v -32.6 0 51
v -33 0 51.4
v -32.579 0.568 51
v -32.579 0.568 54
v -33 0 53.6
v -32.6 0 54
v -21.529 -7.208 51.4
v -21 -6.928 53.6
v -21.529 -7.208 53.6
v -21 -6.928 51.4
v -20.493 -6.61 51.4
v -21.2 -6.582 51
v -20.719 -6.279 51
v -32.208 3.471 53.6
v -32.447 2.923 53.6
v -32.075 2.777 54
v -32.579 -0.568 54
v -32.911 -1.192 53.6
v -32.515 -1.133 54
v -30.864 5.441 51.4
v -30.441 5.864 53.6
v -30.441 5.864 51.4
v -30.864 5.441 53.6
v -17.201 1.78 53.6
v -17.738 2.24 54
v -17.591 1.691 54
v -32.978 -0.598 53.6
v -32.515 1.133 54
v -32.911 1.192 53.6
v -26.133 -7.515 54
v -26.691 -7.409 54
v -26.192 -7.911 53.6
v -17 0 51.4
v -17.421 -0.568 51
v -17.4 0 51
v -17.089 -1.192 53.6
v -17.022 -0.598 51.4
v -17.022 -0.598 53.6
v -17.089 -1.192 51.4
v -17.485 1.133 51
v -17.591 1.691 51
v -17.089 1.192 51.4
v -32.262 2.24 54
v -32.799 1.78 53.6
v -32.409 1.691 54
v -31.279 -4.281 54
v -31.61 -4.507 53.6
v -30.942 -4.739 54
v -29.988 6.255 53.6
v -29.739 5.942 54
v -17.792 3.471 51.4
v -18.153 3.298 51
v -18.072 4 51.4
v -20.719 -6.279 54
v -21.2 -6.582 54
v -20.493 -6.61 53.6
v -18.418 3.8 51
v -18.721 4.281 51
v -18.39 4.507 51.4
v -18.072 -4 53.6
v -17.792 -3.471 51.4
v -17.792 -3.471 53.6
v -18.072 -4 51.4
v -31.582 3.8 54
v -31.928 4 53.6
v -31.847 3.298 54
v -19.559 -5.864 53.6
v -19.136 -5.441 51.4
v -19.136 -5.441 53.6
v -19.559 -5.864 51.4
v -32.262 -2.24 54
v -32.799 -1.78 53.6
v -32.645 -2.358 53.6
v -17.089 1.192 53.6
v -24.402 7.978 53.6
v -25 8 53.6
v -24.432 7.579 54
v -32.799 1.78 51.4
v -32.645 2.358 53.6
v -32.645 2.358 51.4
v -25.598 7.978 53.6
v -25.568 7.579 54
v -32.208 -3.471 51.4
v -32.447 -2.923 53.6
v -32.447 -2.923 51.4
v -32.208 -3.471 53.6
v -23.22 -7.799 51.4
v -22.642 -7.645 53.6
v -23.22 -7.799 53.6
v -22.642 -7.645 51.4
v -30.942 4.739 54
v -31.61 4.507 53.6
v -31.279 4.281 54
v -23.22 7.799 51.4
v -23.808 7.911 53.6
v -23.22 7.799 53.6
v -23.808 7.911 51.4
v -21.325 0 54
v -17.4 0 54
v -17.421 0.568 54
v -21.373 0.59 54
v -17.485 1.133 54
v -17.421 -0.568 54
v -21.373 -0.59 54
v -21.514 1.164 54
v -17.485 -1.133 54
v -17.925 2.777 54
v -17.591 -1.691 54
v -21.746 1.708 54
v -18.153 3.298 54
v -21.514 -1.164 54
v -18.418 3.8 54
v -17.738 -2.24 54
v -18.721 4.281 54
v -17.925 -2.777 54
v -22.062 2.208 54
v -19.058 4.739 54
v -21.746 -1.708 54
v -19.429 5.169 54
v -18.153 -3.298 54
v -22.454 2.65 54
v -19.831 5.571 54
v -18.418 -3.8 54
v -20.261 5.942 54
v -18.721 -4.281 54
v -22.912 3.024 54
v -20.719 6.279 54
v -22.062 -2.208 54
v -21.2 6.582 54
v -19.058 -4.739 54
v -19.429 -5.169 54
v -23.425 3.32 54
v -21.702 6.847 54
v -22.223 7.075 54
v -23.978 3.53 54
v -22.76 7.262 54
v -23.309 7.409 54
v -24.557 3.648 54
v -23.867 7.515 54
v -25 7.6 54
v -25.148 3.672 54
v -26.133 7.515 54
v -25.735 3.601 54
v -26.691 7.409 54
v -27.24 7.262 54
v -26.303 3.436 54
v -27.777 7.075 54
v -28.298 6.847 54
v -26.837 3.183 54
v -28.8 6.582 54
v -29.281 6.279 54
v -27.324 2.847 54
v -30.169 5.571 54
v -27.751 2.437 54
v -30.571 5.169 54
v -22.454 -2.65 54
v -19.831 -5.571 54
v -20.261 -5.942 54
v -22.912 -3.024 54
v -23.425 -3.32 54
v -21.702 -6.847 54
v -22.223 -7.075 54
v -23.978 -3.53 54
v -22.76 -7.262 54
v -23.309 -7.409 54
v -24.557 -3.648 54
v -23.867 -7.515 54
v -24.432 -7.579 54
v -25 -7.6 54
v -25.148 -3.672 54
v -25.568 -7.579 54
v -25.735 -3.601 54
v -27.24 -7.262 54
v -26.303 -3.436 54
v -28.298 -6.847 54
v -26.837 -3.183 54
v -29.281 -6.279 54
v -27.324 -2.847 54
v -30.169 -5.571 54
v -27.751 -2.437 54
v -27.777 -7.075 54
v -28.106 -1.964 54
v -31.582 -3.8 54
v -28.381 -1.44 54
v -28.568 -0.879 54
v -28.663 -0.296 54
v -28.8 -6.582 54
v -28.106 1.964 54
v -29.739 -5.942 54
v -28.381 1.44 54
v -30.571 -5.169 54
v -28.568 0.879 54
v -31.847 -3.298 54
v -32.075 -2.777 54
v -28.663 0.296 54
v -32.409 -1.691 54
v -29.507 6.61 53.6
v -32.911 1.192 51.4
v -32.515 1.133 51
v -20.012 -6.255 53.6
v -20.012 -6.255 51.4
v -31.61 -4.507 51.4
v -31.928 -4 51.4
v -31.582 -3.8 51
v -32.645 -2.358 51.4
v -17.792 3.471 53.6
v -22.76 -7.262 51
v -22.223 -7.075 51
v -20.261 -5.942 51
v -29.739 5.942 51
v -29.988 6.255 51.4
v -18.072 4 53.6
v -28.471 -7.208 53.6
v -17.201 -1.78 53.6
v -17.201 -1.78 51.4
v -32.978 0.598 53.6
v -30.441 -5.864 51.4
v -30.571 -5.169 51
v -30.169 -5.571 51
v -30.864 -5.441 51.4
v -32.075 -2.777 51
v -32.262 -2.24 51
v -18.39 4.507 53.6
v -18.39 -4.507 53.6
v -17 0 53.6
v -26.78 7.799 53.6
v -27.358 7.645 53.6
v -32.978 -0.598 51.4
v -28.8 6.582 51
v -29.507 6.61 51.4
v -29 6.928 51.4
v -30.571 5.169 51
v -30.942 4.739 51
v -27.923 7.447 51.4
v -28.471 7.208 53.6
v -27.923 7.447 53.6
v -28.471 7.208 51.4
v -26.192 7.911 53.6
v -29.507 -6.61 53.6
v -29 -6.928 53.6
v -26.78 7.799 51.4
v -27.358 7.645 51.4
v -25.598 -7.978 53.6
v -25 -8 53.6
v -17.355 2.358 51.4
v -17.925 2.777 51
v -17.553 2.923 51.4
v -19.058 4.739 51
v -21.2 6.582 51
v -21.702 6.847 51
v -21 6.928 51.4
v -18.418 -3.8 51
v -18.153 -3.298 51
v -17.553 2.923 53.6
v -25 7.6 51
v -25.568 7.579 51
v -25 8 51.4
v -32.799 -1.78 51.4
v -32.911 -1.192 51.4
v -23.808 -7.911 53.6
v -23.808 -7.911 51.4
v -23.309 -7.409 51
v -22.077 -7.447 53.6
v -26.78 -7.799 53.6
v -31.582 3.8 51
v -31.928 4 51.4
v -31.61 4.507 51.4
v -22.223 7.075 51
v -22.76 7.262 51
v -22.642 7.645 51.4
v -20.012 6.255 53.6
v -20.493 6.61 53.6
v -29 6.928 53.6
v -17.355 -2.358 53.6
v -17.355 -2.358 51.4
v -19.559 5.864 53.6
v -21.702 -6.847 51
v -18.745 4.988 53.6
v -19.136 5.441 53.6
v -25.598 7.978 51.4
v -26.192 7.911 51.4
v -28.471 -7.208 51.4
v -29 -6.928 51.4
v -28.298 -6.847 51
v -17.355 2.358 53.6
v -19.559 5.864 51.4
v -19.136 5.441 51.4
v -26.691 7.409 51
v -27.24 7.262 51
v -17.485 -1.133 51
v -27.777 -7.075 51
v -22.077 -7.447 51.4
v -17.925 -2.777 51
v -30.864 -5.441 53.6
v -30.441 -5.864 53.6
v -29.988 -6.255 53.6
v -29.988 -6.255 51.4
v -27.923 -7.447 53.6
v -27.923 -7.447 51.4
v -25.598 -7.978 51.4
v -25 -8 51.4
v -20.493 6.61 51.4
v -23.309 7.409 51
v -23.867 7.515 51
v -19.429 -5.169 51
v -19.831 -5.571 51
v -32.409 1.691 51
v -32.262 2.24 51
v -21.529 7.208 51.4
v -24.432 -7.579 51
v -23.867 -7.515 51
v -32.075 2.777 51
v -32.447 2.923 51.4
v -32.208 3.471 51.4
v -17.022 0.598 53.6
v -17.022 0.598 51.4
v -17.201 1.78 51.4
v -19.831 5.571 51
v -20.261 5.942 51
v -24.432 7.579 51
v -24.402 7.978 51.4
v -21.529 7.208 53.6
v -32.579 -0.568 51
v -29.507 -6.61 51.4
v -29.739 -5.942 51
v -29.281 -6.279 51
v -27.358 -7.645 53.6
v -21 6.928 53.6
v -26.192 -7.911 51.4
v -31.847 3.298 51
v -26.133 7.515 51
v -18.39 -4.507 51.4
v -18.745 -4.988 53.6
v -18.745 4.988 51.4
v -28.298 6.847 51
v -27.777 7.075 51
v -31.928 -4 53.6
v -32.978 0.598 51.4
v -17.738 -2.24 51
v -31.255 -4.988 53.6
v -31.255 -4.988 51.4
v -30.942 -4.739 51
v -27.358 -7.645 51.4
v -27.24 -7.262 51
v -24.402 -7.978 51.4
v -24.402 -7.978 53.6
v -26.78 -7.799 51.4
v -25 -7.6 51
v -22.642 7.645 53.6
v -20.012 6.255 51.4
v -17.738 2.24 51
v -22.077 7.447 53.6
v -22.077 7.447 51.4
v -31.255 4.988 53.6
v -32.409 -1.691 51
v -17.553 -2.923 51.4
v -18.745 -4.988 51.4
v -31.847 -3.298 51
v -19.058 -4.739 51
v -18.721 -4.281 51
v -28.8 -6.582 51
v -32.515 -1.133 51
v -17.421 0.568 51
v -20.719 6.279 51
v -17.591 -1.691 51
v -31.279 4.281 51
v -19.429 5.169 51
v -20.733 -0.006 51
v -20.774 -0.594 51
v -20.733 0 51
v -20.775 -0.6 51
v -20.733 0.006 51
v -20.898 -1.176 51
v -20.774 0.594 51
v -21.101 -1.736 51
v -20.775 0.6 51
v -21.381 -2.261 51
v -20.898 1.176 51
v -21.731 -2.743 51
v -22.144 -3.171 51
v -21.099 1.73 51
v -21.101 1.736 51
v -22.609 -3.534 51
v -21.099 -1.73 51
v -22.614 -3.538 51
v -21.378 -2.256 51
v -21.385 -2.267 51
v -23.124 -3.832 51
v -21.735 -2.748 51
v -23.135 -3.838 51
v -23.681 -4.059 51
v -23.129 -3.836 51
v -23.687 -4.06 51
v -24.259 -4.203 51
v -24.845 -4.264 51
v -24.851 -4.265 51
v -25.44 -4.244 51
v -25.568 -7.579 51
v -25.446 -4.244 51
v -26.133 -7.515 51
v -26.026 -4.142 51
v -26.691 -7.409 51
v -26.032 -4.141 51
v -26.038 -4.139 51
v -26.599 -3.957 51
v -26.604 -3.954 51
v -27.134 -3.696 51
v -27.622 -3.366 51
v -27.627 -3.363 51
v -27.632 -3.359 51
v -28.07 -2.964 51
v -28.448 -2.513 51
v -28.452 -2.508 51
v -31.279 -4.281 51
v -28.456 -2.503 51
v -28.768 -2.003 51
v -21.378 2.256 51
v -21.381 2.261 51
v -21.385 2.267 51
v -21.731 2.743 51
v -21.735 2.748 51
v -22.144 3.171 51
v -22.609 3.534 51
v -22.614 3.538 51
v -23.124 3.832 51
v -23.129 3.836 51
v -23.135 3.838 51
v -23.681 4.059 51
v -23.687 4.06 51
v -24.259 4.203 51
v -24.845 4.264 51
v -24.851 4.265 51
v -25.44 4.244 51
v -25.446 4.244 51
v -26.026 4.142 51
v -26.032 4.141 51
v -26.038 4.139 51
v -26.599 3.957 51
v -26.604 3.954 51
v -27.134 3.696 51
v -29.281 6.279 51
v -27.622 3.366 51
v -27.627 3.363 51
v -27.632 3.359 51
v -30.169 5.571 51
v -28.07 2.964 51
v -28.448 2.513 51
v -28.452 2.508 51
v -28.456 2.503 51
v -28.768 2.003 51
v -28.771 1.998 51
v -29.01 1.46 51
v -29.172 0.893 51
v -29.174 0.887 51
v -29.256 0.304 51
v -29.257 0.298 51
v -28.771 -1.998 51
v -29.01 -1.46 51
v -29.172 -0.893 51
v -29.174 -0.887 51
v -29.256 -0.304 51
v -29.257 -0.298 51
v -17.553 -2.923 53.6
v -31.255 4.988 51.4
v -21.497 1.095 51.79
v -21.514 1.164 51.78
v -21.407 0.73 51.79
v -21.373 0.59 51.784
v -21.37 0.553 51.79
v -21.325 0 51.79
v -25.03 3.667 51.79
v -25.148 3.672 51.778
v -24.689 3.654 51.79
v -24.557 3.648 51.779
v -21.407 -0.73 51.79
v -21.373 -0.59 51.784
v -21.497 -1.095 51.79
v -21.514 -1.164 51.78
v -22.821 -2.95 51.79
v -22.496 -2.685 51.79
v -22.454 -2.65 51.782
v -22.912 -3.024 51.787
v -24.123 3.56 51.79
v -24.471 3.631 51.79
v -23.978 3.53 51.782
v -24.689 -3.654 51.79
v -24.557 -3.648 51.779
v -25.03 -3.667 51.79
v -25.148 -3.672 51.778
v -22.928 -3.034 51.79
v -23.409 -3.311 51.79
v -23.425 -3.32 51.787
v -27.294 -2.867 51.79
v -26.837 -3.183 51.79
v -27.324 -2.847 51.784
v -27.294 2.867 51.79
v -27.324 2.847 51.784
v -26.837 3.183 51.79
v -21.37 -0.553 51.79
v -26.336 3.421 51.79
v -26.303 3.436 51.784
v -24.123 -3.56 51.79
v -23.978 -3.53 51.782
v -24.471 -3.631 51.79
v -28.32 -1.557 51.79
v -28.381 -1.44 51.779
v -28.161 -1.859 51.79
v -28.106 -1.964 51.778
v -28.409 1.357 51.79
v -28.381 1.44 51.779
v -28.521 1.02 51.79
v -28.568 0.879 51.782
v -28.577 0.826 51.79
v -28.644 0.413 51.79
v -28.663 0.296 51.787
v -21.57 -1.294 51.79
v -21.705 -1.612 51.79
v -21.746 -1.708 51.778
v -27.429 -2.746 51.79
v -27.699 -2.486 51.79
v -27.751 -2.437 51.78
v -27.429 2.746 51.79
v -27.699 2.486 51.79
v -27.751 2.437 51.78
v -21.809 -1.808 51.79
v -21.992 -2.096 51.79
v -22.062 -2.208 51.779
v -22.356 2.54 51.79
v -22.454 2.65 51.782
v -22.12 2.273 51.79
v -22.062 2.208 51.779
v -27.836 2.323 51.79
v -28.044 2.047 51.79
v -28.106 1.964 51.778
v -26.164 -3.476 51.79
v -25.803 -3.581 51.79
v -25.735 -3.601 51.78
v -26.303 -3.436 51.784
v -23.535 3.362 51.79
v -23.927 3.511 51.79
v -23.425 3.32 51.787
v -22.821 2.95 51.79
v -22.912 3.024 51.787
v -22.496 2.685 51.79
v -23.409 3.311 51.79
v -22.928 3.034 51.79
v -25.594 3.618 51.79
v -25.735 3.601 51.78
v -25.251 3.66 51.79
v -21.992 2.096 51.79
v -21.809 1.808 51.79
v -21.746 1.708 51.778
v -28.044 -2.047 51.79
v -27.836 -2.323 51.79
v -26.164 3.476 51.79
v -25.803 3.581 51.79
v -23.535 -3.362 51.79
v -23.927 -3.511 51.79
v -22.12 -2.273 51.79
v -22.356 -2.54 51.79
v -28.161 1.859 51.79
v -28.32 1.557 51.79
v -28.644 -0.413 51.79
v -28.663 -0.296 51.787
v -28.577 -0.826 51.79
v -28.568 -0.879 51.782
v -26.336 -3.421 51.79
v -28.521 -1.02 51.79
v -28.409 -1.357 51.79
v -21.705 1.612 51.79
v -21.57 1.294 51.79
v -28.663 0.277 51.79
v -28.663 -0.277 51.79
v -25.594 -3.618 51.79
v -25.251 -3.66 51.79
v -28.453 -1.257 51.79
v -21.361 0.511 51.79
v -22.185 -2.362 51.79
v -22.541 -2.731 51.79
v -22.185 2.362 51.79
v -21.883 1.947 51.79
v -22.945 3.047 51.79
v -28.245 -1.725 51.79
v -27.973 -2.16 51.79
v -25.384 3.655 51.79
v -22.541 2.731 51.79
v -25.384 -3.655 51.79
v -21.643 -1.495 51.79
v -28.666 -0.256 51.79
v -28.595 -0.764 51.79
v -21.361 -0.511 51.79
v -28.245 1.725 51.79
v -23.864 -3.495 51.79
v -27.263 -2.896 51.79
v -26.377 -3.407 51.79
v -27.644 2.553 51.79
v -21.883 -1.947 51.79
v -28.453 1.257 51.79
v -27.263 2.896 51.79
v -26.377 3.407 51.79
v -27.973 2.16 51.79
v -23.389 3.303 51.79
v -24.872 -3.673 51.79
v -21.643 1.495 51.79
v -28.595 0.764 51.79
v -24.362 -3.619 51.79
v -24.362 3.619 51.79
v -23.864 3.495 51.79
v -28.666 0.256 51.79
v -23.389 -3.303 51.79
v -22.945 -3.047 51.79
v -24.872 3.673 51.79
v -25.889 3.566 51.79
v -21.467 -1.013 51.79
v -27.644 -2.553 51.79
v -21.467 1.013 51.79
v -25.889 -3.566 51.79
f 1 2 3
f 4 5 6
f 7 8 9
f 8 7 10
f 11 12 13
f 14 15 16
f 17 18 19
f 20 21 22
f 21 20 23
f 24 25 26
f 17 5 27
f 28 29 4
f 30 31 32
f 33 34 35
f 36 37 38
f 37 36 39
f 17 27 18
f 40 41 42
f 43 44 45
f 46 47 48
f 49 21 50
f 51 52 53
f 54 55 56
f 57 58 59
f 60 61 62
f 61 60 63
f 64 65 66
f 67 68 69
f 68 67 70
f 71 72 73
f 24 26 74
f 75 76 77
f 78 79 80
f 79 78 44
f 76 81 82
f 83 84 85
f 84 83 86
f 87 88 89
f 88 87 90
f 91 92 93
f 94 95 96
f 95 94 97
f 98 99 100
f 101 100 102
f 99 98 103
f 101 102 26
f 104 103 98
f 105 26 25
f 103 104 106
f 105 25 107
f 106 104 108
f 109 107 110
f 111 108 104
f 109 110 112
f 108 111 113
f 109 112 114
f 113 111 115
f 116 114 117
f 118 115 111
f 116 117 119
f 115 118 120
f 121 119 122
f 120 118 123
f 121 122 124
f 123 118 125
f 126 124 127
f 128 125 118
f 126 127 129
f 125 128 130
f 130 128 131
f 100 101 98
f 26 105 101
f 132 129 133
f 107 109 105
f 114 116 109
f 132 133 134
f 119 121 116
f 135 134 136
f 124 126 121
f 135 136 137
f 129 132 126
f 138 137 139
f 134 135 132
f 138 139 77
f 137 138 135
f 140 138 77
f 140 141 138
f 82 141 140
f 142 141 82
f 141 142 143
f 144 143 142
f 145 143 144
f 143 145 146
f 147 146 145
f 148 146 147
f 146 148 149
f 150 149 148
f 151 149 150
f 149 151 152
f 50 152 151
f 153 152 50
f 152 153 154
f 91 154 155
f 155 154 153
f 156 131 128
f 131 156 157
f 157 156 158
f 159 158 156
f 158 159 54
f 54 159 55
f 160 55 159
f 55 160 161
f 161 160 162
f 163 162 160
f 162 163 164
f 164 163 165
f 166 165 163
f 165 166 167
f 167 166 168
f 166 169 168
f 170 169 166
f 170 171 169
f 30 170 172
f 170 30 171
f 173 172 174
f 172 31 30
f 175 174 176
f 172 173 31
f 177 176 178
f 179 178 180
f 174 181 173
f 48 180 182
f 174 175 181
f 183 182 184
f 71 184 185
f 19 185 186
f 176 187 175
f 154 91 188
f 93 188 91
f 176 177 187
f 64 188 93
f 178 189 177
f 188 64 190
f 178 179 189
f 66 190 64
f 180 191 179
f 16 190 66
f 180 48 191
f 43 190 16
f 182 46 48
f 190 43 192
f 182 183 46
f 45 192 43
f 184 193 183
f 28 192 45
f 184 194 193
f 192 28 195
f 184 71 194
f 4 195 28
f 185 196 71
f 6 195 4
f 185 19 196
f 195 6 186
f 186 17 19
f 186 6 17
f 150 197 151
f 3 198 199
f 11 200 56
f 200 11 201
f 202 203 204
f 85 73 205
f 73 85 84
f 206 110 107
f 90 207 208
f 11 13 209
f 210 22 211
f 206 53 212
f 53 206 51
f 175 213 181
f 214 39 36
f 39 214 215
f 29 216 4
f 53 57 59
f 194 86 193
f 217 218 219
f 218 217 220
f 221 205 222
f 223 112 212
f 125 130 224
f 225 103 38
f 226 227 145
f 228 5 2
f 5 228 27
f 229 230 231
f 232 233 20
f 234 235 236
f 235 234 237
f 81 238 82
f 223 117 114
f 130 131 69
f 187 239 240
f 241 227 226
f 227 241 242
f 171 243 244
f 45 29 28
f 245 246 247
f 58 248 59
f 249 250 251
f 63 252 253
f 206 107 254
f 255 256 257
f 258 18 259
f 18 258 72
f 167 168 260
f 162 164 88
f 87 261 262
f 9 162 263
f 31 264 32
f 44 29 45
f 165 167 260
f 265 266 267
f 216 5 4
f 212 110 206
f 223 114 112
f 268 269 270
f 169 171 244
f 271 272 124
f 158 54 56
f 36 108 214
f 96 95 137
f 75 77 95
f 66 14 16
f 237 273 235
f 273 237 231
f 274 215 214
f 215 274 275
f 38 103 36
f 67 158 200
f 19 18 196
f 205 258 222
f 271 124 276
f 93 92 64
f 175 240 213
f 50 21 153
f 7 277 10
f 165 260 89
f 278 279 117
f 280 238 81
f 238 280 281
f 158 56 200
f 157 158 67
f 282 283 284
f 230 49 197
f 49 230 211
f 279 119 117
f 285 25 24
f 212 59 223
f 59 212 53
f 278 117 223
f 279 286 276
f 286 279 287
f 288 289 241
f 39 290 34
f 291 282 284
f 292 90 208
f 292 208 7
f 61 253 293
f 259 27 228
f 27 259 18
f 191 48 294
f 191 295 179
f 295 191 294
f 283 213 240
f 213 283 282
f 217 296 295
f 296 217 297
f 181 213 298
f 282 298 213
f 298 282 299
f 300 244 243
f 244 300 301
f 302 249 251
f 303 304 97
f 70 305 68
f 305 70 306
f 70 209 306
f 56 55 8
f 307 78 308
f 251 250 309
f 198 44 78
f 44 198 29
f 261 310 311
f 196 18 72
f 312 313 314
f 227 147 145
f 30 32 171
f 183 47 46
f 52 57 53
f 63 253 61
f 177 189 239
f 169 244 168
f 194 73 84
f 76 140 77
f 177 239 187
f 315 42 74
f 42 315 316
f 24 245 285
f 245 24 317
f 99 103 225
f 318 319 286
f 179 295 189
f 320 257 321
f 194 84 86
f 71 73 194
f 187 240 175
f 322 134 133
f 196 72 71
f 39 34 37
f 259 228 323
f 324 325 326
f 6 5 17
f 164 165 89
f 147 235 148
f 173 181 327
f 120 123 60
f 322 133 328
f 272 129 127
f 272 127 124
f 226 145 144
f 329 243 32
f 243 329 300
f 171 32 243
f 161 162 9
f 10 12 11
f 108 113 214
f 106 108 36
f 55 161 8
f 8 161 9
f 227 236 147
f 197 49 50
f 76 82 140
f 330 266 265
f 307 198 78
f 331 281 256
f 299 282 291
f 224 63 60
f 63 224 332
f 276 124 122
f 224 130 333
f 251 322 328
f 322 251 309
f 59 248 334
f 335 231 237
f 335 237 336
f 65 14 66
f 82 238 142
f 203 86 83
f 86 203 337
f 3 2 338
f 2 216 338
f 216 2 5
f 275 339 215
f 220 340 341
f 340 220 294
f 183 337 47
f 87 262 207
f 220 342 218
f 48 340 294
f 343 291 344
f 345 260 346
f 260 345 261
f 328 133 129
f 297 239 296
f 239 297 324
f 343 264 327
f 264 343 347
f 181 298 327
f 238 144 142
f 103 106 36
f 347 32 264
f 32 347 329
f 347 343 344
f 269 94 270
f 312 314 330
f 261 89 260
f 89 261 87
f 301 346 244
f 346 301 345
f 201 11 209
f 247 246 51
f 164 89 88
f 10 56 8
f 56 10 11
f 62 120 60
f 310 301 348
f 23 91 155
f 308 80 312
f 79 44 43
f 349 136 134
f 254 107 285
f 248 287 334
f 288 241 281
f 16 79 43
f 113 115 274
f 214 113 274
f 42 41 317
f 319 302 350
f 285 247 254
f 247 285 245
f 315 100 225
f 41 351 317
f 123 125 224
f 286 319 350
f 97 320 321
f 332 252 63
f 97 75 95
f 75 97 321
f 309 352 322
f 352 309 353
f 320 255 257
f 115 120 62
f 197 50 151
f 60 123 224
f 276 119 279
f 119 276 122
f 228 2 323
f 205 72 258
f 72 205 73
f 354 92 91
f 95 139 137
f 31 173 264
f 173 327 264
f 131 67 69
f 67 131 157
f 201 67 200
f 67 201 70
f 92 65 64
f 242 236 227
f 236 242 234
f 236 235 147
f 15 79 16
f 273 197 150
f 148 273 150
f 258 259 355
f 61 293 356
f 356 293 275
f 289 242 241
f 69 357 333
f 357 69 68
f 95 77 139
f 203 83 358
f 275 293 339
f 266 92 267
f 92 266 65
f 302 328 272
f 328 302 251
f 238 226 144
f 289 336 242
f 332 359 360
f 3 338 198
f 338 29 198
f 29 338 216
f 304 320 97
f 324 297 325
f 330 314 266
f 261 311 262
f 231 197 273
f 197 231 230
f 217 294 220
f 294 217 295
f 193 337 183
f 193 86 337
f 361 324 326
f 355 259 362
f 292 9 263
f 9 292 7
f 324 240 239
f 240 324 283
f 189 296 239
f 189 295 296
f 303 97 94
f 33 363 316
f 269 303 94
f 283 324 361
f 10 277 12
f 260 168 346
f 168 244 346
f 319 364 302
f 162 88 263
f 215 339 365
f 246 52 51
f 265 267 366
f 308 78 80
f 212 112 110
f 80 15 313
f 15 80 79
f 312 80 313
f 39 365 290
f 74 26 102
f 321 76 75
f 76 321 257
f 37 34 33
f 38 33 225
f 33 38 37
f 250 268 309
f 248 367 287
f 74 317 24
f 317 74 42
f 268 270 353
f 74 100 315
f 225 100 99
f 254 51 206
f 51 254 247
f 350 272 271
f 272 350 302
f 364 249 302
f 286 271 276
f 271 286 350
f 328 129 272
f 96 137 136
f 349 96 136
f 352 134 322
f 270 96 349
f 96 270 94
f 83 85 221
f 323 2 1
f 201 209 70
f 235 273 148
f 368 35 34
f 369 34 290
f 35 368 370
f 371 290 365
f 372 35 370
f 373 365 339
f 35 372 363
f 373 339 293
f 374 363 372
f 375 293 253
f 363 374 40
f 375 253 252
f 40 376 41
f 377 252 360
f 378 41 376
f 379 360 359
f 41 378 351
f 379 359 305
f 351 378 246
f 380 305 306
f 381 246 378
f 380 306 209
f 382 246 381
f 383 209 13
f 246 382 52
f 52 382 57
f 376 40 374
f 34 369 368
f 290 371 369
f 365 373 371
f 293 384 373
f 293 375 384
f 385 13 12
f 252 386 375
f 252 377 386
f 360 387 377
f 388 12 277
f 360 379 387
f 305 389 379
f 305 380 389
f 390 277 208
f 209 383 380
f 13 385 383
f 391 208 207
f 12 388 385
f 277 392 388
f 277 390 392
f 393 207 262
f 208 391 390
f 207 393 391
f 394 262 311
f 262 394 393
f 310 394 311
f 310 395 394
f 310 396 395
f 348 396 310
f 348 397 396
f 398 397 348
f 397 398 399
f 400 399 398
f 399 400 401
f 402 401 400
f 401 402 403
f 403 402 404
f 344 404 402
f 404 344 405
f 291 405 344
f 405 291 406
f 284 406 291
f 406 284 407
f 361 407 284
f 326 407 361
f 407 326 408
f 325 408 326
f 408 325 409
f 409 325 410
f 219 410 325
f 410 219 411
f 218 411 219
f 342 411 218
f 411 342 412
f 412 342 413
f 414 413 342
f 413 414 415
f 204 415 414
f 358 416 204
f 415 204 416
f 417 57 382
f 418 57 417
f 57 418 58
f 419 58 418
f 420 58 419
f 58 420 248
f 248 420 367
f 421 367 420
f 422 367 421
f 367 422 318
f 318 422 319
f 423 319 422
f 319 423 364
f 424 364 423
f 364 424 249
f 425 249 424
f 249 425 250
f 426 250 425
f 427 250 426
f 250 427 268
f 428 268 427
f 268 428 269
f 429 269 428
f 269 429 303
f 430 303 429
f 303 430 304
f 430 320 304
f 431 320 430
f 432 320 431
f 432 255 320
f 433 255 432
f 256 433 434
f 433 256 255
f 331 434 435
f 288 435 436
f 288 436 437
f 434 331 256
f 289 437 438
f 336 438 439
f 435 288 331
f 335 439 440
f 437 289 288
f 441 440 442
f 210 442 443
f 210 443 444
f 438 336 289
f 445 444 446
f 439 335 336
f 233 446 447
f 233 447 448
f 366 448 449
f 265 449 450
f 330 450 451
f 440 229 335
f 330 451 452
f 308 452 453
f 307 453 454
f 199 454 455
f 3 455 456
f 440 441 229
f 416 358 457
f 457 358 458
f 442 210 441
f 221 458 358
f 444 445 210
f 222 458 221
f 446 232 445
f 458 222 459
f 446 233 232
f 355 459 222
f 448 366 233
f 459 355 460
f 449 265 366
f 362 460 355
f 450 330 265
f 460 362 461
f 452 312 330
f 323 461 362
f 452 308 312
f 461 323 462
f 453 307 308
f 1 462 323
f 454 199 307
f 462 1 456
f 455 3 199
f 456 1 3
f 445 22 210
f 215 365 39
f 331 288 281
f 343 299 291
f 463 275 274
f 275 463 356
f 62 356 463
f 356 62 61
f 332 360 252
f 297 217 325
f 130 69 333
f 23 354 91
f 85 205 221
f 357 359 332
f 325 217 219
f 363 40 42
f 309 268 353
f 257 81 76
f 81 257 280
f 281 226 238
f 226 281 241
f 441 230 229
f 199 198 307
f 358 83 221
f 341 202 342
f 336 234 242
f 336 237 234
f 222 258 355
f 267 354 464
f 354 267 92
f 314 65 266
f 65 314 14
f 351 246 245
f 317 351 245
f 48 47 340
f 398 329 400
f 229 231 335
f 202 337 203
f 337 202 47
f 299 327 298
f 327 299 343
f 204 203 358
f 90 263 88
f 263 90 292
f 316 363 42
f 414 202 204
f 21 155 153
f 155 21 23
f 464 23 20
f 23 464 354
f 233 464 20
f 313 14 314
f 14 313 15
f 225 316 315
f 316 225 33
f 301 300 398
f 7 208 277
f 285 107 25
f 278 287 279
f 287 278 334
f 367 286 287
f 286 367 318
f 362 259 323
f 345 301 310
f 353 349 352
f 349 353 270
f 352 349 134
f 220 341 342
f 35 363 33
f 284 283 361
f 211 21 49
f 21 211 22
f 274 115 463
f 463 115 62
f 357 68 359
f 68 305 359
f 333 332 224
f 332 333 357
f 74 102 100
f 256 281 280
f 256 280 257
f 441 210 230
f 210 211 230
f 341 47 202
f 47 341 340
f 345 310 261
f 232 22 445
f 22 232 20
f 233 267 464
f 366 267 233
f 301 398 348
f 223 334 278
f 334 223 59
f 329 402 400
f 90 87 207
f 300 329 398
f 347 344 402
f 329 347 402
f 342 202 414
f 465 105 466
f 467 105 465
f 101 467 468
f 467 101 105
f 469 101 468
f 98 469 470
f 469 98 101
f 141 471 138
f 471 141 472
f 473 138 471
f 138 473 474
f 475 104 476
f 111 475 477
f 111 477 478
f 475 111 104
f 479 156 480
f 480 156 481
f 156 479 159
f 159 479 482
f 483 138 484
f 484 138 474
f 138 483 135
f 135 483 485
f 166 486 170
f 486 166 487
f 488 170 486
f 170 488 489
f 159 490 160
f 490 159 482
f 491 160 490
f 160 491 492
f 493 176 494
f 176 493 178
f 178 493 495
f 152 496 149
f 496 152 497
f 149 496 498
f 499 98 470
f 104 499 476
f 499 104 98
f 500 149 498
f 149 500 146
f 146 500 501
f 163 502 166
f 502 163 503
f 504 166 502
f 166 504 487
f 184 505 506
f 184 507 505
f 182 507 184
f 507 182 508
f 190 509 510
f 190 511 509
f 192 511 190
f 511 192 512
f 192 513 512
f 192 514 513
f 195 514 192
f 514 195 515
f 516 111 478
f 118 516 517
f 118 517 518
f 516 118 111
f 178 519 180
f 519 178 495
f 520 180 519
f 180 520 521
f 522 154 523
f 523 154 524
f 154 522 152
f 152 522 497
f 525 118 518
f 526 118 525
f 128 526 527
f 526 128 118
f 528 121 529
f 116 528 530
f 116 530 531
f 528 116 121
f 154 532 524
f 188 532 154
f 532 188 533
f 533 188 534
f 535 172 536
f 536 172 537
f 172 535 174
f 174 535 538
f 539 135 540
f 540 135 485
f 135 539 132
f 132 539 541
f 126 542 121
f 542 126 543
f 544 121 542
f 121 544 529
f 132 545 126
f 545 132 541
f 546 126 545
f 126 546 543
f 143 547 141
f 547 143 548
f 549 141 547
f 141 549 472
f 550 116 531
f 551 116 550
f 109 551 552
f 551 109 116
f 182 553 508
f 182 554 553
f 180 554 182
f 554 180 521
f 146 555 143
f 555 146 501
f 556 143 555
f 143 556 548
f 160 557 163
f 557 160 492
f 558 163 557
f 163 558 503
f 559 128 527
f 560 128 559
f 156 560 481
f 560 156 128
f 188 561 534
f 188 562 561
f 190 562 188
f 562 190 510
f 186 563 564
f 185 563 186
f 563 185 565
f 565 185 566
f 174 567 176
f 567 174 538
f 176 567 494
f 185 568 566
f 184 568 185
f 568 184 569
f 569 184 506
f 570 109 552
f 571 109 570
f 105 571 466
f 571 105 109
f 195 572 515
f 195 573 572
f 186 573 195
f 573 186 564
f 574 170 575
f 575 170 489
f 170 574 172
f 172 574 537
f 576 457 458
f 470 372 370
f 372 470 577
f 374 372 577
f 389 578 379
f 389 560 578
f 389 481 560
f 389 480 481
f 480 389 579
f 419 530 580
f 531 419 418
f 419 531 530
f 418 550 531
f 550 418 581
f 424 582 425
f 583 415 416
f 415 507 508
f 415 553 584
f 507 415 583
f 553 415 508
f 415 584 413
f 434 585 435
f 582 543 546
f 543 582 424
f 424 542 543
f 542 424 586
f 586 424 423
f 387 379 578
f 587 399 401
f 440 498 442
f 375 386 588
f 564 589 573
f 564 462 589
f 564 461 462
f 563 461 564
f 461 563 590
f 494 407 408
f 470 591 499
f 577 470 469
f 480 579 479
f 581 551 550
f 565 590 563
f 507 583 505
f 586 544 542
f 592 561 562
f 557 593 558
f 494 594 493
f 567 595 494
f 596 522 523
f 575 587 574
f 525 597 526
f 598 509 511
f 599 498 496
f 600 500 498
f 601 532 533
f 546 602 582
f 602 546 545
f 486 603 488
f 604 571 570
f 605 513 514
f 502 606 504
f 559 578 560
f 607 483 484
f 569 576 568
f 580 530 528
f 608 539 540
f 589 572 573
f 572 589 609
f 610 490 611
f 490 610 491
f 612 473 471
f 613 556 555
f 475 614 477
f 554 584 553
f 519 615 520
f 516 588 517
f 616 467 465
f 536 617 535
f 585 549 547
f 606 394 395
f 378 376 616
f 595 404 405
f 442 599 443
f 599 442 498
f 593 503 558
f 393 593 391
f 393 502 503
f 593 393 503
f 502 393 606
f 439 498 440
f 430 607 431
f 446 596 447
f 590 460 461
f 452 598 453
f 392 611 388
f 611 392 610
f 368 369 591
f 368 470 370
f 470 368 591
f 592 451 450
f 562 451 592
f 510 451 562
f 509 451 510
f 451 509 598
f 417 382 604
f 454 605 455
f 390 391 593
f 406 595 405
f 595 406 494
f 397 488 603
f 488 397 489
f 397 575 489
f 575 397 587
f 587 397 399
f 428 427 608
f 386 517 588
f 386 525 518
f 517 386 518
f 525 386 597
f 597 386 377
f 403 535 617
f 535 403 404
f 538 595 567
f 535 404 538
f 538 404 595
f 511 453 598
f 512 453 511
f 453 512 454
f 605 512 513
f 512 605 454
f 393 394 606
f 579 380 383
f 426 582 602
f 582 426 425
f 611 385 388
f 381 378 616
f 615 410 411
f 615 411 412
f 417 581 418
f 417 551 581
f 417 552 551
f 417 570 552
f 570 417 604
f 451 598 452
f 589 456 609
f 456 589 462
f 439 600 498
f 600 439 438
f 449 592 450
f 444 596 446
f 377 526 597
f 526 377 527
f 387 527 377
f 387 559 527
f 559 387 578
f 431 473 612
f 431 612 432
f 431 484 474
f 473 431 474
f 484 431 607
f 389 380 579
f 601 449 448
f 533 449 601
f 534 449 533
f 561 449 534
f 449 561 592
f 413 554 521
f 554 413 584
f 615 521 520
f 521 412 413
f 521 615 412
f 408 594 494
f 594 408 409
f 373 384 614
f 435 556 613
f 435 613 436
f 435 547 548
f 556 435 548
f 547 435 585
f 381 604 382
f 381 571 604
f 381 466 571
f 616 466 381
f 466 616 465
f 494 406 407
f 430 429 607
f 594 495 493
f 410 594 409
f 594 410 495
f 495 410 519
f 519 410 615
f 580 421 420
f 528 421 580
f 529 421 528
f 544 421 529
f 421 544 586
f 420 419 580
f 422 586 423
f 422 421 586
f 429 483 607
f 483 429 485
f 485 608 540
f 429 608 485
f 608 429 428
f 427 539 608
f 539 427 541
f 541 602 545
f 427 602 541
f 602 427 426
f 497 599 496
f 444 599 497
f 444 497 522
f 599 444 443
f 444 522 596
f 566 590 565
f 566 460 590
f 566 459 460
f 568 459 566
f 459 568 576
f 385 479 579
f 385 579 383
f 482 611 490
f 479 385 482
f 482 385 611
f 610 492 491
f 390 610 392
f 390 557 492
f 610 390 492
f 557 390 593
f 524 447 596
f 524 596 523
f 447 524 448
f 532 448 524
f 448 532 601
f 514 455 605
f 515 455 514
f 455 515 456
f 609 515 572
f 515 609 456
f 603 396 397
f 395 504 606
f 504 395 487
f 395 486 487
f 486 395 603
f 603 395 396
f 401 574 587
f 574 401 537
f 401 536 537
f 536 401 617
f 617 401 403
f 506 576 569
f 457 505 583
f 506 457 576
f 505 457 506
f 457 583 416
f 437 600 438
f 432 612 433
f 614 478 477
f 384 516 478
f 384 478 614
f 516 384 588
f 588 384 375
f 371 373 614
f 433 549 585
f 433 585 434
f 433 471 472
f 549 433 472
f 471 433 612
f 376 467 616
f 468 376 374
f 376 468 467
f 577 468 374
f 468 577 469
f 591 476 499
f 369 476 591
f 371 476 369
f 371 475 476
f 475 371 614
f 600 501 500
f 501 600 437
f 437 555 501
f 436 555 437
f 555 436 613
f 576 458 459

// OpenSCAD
// file: ../lib/common.scad
// ============================================================================
//  Вспомогательные модули общего назначения.
//  Подключать через use <lib/common.scad> — файл не содержит параметров
//  проекта и ни от чего не зависит.
// ============================================================================

_eps = 0.01;

// --------------------------------------------------------------------- 2D ---
// Прямоугольник со скруглёнными углами, по центру
module rrect(w, d, r) {
    rr = min(r, w/2 - _eps, d/2 - _eps);
    if (rr > 0) offset(r = rr) square([w - 2*rr, d - 2*rr], center = true);
    else square([w, d], center = true);
}

// --------------------------------------------------------------------- 3D ---
// Коробка со скруглением ТОЛЬКО вертикальных рёбер: нижние и верхние острые
module rounded_box(w, d, h, r) linear_extrude(height = h) rrect(w, d, r);

// Цилиндр с фасками на торцах (снимает «слоновью ногу» и облегчает посадку)
module chamfered_cyl(d, h, ch = 0.6, bottom = true, top = true) {
    r  = d/2;
    cb = bottom ? min(ch, h/2) : 0;
    ct = top    ? min(ch, h/2) : 0;
    if (cb <= 0 && ct <= 0) cylinder(d = d, h = h);
    else rotate_extrude(angle = 360) polygon(concat(
        [[0, 0]],
        cb > 0 ? [[r - cb, 0], [r, cb]] : [[r, 0]],
        ct > 0 ? [[r, h - ct], [r - ct, h]] : [[r, h]],
        [[0, h]]));
}

// Труба
module tube(od, id, h) difference() {
    cylinder(d = od, h = h);
    translate([0, 0, -_eps]) cylinder(d = id, h = h + 2*_eps);
}

// Сквозное отверстие, растянутое вверх-вниз для гарантированного вычитания
module thru(d, h) translate([0, 0, -_eps]) cylinder(d = d, h = h + 2*_eps);

// Потайное отверстие под саморез с конической головкой.
// Пластина занимает z = [0 .. t], головка утапливается сверху,
// саморез идёт вниз (в ответную стойку).
module countersunk_hole(free_d, head_d, t, down = 30) {
    cone_h = (head_d - free_d)/2;    // головка 90 градусов
    union() {
        translate([0, 0, -down]) cylinder(d = free_d, h = down + t - cone_h + _eps);
        translate([0, 0, t - cone_h]) cylinder(d1 = free_d, d2 = head_d, h = cone_h);
    }
}

// Паз (щелевое отверстие) длиной len по X, сквозной по высоте h
module slot(len, d, h) hull() for (s = [-1, 1])
    translate([s*(len - d)/2, 0, 0]) cylinder(d = d, h = h);

// Стойка под саморез: цилиндр с пилотным отверстием сверху.
// Снизу фаски нет — стойка растёт из дна детали.
module screw_boss(od, h, pilot_d, pilot_depth, ch = 0.6) difference() {
    chamfered_cyl(od, h, ch = ch, bottom = false, top = true);
    translate([0, 0, h - pilot_depth]) cylinder(d = pilot_d, h = pilot_depth + _eps);
}

// Треугольная косынка в плоскости XZ (катеты l по X и h по Z), толщина t по Y
module gusset(l, h, t) translate([0, -t/2, 0]) linear_extrude(height = t)
    polygon([[0, 0], [l, 0], [0, h]]);

// Конусное гнездо под заточенный винт-ось (ось Z вниз от z=0)
module cone_seat(d, depth) translate([0, 0, -depth])
    cylinder(d1 = 0.2, d2 = d, h = depth + _eps);

// Канавка под круглый пассик: тор, вычитаемый из обода
module belt_groove(pulley_d, groove_r) rotate_extrude(angle = 360)
    translate([pulley_d/2, 0]) circle(r = groove_r);

// Сетка облегчающих отверстий по кругу
module radial_holes(n, r, d, h) for (i = [0 : n - 1])
    rotate([0, 0, i*360/n]) translate([r, 0, 0]) thru(d, h);
// main file
// ============================================================================
//  ШАЙБА ПОД ДИСК
//
//  Садится на уступ 8→7.1, диск — на неё. Нужна, потому что диск внатуру
//  ложился на крышку и не крутился. Толщина platter_washer_h; если мало
//  или много — перепечатать только шайбу. Отверстие то же, что у диска
//  (platter_bore_clr), наружный диаметр — как ступица, чтобы не торчала.
//
//  Печать: плашмя, без поддержек.
// ============================================================================

include <../params.scad>
use <../lib/common.scad>

module platter_washer() {
    bore_d = spindle_tip_d + platter_bore_clr;
    translate([platter_pos[0], platter_pos[1], spindle_tip_z]) difference() {
        chamfered_cyl(platter_hub_d, platter_washer_h, ch = 0.4);
        thru(bore_d, platter_washer_h);
        translate([0, 0, -eps])
            cylinder(d1 = bore_d + 1.2, d2 = bore_d, h = 0.8);
    }
}

platter_washer();
